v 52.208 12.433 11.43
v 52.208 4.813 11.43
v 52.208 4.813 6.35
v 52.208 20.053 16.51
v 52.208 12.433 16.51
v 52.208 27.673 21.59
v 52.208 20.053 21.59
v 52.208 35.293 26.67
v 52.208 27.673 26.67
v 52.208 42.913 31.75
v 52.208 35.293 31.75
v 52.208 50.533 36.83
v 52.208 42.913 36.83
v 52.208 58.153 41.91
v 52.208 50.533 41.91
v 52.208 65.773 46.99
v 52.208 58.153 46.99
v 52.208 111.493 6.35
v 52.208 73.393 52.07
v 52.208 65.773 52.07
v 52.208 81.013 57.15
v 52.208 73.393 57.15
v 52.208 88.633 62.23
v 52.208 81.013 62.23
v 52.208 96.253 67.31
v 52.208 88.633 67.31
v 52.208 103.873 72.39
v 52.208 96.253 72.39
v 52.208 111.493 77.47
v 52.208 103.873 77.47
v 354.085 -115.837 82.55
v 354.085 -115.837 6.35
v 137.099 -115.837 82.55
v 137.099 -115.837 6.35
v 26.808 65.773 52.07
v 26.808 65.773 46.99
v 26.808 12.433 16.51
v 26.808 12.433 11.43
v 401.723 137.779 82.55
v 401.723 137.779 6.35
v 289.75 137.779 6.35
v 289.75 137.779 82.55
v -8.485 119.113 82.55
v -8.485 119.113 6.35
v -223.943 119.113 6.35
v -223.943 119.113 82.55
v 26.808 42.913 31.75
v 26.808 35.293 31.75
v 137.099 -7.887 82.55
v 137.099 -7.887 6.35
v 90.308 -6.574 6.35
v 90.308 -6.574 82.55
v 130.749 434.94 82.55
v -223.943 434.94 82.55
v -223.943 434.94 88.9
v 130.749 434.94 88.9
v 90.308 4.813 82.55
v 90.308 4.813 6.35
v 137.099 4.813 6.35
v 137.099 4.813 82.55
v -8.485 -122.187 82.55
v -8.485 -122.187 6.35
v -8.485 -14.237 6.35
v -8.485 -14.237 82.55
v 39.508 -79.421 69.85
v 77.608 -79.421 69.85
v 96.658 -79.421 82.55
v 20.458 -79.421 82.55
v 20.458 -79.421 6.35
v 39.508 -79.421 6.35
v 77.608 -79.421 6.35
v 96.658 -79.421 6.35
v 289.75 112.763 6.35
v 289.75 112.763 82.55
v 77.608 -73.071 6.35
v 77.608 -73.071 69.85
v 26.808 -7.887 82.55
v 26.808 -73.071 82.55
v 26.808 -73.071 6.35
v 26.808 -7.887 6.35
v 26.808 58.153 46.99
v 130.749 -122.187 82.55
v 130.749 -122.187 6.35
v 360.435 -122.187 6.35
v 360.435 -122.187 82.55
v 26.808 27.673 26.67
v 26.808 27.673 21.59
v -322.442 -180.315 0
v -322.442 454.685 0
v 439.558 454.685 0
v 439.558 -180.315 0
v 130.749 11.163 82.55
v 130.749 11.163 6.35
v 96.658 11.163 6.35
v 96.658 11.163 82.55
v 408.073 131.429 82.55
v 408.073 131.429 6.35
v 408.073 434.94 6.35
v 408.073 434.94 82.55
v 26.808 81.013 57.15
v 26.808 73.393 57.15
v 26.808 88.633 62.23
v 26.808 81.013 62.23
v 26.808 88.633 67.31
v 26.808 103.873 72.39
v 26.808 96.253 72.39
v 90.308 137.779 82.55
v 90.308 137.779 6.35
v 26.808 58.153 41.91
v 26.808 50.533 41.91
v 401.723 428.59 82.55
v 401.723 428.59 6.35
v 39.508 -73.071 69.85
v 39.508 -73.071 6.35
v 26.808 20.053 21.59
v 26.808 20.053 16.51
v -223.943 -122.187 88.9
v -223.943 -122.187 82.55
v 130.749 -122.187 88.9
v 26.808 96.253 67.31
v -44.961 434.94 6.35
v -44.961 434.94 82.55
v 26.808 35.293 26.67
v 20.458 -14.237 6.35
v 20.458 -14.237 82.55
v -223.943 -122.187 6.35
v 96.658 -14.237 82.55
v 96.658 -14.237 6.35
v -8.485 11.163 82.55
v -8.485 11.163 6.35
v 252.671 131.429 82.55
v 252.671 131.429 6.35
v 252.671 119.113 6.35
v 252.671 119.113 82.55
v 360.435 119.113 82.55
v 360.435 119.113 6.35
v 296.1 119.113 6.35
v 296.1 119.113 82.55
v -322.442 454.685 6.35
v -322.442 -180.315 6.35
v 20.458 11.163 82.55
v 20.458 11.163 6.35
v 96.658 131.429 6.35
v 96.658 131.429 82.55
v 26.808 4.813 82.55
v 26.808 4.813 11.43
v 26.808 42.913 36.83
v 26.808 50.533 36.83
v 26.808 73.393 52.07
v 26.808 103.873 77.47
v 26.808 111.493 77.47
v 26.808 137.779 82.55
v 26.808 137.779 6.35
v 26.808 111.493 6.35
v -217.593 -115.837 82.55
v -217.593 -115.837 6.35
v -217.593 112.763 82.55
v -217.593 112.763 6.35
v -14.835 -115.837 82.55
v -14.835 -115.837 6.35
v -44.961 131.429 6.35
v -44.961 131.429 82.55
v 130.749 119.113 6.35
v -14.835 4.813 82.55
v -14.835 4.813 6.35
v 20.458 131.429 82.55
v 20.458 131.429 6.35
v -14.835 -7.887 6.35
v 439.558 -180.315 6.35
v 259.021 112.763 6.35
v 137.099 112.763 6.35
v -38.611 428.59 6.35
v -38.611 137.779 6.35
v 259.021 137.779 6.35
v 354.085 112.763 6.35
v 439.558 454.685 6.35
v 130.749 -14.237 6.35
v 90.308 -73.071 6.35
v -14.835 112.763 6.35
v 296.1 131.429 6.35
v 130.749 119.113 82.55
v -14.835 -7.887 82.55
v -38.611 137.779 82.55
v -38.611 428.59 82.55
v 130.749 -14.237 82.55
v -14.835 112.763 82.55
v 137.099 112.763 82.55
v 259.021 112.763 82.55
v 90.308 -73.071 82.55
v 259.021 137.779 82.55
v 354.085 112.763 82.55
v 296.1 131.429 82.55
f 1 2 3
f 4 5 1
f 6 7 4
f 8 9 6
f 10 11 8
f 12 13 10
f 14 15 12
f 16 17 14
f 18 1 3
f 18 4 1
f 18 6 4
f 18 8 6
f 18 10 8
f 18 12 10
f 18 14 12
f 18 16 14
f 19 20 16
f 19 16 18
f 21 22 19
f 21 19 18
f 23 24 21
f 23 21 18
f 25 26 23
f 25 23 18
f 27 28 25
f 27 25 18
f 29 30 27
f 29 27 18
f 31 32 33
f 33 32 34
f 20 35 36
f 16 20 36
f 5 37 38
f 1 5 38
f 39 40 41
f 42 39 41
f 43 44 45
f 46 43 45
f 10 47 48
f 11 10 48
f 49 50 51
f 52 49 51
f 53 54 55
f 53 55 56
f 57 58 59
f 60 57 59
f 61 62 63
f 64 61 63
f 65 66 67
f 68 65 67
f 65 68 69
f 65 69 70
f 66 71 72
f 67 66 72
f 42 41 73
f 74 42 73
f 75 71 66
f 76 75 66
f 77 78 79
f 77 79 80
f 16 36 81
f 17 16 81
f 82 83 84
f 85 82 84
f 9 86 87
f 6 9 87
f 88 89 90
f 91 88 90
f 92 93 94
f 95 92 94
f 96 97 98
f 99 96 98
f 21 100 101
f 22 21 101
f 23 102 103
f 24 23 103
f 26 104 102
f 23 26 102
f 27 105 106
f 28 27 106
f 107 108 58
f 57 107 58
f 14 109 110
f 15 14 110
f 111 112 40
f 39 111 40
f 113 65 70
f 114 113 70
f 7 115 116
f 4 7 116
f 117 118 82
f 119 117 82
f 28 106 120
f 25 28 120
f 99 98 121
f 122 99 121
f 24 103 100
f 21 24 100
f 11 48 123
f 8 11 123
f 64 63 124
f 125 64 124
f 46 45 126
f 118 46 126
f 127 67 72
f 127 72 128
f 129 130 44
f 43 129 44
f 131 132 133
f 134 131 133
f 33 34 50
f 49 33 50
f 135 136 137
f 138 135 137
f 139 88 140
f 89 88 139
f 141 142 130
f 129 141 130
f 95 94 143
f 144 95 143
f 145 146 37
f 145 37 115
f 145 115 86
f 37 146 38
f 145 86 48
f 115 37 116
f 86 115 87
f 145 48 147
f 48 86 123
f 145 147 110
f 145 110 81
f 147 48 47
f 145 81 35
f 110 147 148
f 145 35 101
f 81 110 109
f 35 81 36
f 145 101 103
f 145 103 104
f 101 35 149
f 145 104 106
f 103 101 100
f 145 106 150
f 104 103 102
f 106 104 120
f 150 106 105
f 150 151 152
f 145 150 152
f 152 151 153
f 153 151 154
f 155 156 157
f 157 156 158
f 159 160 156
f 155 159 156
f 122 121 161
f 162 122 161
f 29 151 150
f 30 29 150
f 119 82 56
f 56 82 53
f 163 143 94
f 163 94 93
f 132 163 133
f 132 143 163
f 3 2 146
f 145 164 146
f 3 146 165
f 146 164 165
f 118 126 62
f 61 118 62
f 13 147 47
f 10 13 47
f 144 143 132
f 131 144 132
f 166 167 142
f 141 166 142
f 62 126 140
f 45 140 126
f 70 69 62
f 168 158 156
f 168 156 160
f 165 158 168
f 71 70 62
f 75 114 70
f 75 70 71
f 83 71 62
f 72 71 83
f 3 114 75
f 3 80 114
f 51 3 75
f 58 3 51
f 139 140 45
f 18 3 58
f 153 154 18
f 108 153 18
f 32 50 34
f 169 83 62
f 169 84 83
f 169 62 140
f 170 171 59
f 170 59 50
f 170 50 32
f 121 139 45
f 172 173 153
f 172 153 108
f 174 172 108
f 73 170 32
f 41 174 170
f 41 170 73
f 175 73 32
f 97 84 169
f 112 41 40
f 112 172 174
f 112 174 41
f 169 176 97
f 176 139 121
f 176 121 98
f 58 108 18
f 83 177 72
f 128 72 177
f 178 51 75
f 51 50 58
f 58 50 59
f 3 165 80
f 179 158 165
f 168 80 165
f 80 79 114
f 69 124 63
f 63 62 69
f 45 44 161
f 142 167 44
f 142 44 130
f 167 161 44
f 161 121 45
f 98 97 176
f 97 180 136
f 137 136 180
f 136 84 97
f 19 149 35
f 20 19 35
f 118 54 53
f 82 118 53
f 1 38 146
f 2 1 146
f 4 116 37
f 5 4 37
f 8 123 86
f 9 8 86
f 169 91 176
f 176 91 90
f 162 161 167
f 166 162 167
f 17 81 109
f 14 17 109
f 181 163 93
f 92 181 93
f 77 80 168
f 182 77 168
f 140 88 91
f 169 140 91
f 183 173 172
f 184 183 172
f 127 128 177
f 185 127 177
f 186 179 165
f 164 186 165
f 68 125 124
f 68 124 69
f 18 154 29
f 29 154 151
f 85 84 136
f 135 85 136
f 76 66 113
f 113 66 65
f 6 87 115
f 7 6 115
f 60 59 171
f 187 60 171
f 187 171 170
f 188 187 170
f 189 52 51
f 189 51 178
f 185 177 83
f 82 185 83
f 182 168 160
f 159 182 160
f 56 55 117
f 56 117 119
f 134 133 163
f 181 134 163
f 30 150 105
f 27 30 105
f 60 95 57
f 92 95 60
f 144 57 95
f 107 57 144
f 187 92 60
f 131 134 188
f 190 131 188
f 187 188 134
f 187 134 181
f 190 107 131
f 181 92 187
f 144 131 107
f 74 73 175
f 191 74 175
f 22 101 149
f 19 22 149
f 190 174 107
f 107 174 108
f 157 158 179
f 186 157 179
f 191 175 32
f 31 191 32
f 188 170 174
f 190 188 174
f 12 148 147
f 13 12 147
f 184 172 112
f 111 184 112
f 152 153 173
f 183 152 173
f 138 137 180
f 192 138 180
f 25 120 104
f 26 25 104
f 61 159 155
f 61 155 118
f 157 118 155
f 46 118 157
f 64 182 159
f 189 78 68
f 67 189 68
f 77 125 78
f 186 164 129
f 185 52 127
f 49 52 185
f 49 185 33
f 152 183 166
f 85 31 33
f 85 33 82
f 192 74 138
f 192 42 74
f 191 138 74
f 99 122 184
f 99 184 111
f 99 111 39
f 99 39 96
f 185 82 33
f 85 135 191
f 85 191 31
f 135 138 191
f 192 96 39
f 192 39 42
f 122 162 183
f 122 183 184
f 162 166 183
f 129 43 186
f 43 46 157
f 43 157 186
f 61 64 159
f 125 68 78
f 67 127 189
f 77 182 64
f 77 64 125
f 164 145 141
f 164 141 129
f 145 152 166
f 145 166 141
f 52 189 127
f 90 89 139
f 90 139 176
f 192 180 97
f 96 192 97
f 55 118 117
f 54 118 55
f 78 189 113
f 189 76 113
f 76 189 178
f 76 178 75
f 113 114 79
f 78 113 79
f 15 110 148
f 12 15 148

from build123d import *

# Parameters (mm, degrees)
F0_W      = 762
F0_H      = 635
F1_DEPTH  = 6.35
F3_DEPTH  = 76.2
F6_DEPTH  = 25.4
F8_DEPTH  = 25.4
F9_W      = 354.692042
F9_H      = 557.127513
F10_DEPTH = 6.35


with BuildPart() as f1:
    # F0 (on Top) → F1 (new body)
    with BuildSketch(Plane.XY):
        with Locations((58.557814, 137.18461)):
            Rectangle(F0_W, F0_H)
    extrude(amount=F1_DEPTH)

    # F2 (on face) → F3 (join)
    with BuildSketch(Plane.XY.offset(6.35)):
        Polygon((130.749166, -14.237264), (130.749166, -122.187264), (360.435128, -122.187264), (360.435128, 119.112736), (296.099782, 119.112736), (296.099782, 131.429225), (408.072829, 131.429225), (408.072829, 434.940249), (-44.960961, 434.940249), (-44.960961, 131.429225), (20.457814, 131.429225), (20.457814, 11.162736), (-8.485242, 11.162736), (-8.485242, 119.112736), (-223.942876, 119.112736), (-223.942876, -122.187264), (-8.485242, -122.187264), (-8.485242, -14.237264), (20.457814, -14.237264), (20.457814, -79.42088), (96.657814, -79.42088), (96.657814, -14.237264), align=None)
        Polygon((26.807814, -7.887264), (-14.835243, -7.887264), (-14.835243, -115.837263), (-217.592874, -115.837263), (-217.592874, 112.762734), (-14.835243, 112.762734), (-14.835243, 4.812736), (26.807811, 4.812736), (26.807811, 137.779236), (-38.61095, 137.779236), (-38.61095, 428.590238), (401.722819, 428.590238), (401.722819, 137.779236), (289.749771, 137.779236), (289.749771, 112.76274), (354.085132, 112.76274), (354.085132, -115.837269), (137.099162, -115.837269), (137.099162, -7.887264), (90.307814, -6.574249), (90.307814, -73.07088), (26.807814, -73.07088), align=None, mode=Mode.SUBTRACT)
        Polygon((137.099162, 4.812736), (137.099162, 112.76274), (259.020705, 112.76274), (259.020705, 137.779236), (90.307817, 137.779236), (90.307817, 4.812736), align=None)
        Polygon((130.749166, 11.162736), (96.657814, 11.162736), (96.657814, 131.429225), (252.670705, 131.429225), (252.670705, 119.112736), (130.749166, 119.112736), align=None, mode=Mode.SUBTRACT)
    extrude(amount=F3_DEPTH)

    # F5 (on face) → F6 (cut)
    with BuildSketch(Plane.XZ.offset(79.42088)):
        Polygon((39.507814, 6.35), (58.557814, 6.35), (77.607814, 6.35), (77.607814, 69.85), (39.507814, 69.85), align=None)
    extrude(amount=-F6_DEPTH, mode=Mode.SUBTRACT)

    # F7 (on face) → F8 (join)
    with BuildSketch(Plane.YZ.offset(26.807811)):
        Polygon((4.812736, 11.43), (4.812736, 6.35), (111.492736, 6.35), (111.492736, 77.47), (103.872736, 77.47), (103.872736, 72.39), (96.252736, 72.39), (96.252736, 67.31), (88.632736, 67.31), (88.632736, 62.23), (81.012736, 62.23), (81.012736, 57.15), (73.392736, 57.15), (73.392736, 52.07), (65.772736, 52.07), (65.772736, 46.99), (58.152736, 46.99), (58.152736, 41.91), (50.532736, 41.91), (50.532736, 36.83), (42.912736, 36.83), (42.912736, 31.75), (35.292736, 31.75), (35.292736, 26.67), (27.672736, 26.67), (27.672736, 21.59), (20.052736, 21.59), (20.052736, 16.51), (12.432736, 16.51), (12.432736, 11.43), align=None)
    extrude(amount=F8_DEPTH)


with BuildPart() as f10:
    # F9 (on face) → F10 (new body)
    with BuildSketch(Plane.XY.offset(82.55)):
        with Locations((-46.596855, 156.376492)):
            Rectangle(F9_W, F9_H)
    extrude(amount=F10_DEPTH)


solid = Compound([f1.part, f10.part])
